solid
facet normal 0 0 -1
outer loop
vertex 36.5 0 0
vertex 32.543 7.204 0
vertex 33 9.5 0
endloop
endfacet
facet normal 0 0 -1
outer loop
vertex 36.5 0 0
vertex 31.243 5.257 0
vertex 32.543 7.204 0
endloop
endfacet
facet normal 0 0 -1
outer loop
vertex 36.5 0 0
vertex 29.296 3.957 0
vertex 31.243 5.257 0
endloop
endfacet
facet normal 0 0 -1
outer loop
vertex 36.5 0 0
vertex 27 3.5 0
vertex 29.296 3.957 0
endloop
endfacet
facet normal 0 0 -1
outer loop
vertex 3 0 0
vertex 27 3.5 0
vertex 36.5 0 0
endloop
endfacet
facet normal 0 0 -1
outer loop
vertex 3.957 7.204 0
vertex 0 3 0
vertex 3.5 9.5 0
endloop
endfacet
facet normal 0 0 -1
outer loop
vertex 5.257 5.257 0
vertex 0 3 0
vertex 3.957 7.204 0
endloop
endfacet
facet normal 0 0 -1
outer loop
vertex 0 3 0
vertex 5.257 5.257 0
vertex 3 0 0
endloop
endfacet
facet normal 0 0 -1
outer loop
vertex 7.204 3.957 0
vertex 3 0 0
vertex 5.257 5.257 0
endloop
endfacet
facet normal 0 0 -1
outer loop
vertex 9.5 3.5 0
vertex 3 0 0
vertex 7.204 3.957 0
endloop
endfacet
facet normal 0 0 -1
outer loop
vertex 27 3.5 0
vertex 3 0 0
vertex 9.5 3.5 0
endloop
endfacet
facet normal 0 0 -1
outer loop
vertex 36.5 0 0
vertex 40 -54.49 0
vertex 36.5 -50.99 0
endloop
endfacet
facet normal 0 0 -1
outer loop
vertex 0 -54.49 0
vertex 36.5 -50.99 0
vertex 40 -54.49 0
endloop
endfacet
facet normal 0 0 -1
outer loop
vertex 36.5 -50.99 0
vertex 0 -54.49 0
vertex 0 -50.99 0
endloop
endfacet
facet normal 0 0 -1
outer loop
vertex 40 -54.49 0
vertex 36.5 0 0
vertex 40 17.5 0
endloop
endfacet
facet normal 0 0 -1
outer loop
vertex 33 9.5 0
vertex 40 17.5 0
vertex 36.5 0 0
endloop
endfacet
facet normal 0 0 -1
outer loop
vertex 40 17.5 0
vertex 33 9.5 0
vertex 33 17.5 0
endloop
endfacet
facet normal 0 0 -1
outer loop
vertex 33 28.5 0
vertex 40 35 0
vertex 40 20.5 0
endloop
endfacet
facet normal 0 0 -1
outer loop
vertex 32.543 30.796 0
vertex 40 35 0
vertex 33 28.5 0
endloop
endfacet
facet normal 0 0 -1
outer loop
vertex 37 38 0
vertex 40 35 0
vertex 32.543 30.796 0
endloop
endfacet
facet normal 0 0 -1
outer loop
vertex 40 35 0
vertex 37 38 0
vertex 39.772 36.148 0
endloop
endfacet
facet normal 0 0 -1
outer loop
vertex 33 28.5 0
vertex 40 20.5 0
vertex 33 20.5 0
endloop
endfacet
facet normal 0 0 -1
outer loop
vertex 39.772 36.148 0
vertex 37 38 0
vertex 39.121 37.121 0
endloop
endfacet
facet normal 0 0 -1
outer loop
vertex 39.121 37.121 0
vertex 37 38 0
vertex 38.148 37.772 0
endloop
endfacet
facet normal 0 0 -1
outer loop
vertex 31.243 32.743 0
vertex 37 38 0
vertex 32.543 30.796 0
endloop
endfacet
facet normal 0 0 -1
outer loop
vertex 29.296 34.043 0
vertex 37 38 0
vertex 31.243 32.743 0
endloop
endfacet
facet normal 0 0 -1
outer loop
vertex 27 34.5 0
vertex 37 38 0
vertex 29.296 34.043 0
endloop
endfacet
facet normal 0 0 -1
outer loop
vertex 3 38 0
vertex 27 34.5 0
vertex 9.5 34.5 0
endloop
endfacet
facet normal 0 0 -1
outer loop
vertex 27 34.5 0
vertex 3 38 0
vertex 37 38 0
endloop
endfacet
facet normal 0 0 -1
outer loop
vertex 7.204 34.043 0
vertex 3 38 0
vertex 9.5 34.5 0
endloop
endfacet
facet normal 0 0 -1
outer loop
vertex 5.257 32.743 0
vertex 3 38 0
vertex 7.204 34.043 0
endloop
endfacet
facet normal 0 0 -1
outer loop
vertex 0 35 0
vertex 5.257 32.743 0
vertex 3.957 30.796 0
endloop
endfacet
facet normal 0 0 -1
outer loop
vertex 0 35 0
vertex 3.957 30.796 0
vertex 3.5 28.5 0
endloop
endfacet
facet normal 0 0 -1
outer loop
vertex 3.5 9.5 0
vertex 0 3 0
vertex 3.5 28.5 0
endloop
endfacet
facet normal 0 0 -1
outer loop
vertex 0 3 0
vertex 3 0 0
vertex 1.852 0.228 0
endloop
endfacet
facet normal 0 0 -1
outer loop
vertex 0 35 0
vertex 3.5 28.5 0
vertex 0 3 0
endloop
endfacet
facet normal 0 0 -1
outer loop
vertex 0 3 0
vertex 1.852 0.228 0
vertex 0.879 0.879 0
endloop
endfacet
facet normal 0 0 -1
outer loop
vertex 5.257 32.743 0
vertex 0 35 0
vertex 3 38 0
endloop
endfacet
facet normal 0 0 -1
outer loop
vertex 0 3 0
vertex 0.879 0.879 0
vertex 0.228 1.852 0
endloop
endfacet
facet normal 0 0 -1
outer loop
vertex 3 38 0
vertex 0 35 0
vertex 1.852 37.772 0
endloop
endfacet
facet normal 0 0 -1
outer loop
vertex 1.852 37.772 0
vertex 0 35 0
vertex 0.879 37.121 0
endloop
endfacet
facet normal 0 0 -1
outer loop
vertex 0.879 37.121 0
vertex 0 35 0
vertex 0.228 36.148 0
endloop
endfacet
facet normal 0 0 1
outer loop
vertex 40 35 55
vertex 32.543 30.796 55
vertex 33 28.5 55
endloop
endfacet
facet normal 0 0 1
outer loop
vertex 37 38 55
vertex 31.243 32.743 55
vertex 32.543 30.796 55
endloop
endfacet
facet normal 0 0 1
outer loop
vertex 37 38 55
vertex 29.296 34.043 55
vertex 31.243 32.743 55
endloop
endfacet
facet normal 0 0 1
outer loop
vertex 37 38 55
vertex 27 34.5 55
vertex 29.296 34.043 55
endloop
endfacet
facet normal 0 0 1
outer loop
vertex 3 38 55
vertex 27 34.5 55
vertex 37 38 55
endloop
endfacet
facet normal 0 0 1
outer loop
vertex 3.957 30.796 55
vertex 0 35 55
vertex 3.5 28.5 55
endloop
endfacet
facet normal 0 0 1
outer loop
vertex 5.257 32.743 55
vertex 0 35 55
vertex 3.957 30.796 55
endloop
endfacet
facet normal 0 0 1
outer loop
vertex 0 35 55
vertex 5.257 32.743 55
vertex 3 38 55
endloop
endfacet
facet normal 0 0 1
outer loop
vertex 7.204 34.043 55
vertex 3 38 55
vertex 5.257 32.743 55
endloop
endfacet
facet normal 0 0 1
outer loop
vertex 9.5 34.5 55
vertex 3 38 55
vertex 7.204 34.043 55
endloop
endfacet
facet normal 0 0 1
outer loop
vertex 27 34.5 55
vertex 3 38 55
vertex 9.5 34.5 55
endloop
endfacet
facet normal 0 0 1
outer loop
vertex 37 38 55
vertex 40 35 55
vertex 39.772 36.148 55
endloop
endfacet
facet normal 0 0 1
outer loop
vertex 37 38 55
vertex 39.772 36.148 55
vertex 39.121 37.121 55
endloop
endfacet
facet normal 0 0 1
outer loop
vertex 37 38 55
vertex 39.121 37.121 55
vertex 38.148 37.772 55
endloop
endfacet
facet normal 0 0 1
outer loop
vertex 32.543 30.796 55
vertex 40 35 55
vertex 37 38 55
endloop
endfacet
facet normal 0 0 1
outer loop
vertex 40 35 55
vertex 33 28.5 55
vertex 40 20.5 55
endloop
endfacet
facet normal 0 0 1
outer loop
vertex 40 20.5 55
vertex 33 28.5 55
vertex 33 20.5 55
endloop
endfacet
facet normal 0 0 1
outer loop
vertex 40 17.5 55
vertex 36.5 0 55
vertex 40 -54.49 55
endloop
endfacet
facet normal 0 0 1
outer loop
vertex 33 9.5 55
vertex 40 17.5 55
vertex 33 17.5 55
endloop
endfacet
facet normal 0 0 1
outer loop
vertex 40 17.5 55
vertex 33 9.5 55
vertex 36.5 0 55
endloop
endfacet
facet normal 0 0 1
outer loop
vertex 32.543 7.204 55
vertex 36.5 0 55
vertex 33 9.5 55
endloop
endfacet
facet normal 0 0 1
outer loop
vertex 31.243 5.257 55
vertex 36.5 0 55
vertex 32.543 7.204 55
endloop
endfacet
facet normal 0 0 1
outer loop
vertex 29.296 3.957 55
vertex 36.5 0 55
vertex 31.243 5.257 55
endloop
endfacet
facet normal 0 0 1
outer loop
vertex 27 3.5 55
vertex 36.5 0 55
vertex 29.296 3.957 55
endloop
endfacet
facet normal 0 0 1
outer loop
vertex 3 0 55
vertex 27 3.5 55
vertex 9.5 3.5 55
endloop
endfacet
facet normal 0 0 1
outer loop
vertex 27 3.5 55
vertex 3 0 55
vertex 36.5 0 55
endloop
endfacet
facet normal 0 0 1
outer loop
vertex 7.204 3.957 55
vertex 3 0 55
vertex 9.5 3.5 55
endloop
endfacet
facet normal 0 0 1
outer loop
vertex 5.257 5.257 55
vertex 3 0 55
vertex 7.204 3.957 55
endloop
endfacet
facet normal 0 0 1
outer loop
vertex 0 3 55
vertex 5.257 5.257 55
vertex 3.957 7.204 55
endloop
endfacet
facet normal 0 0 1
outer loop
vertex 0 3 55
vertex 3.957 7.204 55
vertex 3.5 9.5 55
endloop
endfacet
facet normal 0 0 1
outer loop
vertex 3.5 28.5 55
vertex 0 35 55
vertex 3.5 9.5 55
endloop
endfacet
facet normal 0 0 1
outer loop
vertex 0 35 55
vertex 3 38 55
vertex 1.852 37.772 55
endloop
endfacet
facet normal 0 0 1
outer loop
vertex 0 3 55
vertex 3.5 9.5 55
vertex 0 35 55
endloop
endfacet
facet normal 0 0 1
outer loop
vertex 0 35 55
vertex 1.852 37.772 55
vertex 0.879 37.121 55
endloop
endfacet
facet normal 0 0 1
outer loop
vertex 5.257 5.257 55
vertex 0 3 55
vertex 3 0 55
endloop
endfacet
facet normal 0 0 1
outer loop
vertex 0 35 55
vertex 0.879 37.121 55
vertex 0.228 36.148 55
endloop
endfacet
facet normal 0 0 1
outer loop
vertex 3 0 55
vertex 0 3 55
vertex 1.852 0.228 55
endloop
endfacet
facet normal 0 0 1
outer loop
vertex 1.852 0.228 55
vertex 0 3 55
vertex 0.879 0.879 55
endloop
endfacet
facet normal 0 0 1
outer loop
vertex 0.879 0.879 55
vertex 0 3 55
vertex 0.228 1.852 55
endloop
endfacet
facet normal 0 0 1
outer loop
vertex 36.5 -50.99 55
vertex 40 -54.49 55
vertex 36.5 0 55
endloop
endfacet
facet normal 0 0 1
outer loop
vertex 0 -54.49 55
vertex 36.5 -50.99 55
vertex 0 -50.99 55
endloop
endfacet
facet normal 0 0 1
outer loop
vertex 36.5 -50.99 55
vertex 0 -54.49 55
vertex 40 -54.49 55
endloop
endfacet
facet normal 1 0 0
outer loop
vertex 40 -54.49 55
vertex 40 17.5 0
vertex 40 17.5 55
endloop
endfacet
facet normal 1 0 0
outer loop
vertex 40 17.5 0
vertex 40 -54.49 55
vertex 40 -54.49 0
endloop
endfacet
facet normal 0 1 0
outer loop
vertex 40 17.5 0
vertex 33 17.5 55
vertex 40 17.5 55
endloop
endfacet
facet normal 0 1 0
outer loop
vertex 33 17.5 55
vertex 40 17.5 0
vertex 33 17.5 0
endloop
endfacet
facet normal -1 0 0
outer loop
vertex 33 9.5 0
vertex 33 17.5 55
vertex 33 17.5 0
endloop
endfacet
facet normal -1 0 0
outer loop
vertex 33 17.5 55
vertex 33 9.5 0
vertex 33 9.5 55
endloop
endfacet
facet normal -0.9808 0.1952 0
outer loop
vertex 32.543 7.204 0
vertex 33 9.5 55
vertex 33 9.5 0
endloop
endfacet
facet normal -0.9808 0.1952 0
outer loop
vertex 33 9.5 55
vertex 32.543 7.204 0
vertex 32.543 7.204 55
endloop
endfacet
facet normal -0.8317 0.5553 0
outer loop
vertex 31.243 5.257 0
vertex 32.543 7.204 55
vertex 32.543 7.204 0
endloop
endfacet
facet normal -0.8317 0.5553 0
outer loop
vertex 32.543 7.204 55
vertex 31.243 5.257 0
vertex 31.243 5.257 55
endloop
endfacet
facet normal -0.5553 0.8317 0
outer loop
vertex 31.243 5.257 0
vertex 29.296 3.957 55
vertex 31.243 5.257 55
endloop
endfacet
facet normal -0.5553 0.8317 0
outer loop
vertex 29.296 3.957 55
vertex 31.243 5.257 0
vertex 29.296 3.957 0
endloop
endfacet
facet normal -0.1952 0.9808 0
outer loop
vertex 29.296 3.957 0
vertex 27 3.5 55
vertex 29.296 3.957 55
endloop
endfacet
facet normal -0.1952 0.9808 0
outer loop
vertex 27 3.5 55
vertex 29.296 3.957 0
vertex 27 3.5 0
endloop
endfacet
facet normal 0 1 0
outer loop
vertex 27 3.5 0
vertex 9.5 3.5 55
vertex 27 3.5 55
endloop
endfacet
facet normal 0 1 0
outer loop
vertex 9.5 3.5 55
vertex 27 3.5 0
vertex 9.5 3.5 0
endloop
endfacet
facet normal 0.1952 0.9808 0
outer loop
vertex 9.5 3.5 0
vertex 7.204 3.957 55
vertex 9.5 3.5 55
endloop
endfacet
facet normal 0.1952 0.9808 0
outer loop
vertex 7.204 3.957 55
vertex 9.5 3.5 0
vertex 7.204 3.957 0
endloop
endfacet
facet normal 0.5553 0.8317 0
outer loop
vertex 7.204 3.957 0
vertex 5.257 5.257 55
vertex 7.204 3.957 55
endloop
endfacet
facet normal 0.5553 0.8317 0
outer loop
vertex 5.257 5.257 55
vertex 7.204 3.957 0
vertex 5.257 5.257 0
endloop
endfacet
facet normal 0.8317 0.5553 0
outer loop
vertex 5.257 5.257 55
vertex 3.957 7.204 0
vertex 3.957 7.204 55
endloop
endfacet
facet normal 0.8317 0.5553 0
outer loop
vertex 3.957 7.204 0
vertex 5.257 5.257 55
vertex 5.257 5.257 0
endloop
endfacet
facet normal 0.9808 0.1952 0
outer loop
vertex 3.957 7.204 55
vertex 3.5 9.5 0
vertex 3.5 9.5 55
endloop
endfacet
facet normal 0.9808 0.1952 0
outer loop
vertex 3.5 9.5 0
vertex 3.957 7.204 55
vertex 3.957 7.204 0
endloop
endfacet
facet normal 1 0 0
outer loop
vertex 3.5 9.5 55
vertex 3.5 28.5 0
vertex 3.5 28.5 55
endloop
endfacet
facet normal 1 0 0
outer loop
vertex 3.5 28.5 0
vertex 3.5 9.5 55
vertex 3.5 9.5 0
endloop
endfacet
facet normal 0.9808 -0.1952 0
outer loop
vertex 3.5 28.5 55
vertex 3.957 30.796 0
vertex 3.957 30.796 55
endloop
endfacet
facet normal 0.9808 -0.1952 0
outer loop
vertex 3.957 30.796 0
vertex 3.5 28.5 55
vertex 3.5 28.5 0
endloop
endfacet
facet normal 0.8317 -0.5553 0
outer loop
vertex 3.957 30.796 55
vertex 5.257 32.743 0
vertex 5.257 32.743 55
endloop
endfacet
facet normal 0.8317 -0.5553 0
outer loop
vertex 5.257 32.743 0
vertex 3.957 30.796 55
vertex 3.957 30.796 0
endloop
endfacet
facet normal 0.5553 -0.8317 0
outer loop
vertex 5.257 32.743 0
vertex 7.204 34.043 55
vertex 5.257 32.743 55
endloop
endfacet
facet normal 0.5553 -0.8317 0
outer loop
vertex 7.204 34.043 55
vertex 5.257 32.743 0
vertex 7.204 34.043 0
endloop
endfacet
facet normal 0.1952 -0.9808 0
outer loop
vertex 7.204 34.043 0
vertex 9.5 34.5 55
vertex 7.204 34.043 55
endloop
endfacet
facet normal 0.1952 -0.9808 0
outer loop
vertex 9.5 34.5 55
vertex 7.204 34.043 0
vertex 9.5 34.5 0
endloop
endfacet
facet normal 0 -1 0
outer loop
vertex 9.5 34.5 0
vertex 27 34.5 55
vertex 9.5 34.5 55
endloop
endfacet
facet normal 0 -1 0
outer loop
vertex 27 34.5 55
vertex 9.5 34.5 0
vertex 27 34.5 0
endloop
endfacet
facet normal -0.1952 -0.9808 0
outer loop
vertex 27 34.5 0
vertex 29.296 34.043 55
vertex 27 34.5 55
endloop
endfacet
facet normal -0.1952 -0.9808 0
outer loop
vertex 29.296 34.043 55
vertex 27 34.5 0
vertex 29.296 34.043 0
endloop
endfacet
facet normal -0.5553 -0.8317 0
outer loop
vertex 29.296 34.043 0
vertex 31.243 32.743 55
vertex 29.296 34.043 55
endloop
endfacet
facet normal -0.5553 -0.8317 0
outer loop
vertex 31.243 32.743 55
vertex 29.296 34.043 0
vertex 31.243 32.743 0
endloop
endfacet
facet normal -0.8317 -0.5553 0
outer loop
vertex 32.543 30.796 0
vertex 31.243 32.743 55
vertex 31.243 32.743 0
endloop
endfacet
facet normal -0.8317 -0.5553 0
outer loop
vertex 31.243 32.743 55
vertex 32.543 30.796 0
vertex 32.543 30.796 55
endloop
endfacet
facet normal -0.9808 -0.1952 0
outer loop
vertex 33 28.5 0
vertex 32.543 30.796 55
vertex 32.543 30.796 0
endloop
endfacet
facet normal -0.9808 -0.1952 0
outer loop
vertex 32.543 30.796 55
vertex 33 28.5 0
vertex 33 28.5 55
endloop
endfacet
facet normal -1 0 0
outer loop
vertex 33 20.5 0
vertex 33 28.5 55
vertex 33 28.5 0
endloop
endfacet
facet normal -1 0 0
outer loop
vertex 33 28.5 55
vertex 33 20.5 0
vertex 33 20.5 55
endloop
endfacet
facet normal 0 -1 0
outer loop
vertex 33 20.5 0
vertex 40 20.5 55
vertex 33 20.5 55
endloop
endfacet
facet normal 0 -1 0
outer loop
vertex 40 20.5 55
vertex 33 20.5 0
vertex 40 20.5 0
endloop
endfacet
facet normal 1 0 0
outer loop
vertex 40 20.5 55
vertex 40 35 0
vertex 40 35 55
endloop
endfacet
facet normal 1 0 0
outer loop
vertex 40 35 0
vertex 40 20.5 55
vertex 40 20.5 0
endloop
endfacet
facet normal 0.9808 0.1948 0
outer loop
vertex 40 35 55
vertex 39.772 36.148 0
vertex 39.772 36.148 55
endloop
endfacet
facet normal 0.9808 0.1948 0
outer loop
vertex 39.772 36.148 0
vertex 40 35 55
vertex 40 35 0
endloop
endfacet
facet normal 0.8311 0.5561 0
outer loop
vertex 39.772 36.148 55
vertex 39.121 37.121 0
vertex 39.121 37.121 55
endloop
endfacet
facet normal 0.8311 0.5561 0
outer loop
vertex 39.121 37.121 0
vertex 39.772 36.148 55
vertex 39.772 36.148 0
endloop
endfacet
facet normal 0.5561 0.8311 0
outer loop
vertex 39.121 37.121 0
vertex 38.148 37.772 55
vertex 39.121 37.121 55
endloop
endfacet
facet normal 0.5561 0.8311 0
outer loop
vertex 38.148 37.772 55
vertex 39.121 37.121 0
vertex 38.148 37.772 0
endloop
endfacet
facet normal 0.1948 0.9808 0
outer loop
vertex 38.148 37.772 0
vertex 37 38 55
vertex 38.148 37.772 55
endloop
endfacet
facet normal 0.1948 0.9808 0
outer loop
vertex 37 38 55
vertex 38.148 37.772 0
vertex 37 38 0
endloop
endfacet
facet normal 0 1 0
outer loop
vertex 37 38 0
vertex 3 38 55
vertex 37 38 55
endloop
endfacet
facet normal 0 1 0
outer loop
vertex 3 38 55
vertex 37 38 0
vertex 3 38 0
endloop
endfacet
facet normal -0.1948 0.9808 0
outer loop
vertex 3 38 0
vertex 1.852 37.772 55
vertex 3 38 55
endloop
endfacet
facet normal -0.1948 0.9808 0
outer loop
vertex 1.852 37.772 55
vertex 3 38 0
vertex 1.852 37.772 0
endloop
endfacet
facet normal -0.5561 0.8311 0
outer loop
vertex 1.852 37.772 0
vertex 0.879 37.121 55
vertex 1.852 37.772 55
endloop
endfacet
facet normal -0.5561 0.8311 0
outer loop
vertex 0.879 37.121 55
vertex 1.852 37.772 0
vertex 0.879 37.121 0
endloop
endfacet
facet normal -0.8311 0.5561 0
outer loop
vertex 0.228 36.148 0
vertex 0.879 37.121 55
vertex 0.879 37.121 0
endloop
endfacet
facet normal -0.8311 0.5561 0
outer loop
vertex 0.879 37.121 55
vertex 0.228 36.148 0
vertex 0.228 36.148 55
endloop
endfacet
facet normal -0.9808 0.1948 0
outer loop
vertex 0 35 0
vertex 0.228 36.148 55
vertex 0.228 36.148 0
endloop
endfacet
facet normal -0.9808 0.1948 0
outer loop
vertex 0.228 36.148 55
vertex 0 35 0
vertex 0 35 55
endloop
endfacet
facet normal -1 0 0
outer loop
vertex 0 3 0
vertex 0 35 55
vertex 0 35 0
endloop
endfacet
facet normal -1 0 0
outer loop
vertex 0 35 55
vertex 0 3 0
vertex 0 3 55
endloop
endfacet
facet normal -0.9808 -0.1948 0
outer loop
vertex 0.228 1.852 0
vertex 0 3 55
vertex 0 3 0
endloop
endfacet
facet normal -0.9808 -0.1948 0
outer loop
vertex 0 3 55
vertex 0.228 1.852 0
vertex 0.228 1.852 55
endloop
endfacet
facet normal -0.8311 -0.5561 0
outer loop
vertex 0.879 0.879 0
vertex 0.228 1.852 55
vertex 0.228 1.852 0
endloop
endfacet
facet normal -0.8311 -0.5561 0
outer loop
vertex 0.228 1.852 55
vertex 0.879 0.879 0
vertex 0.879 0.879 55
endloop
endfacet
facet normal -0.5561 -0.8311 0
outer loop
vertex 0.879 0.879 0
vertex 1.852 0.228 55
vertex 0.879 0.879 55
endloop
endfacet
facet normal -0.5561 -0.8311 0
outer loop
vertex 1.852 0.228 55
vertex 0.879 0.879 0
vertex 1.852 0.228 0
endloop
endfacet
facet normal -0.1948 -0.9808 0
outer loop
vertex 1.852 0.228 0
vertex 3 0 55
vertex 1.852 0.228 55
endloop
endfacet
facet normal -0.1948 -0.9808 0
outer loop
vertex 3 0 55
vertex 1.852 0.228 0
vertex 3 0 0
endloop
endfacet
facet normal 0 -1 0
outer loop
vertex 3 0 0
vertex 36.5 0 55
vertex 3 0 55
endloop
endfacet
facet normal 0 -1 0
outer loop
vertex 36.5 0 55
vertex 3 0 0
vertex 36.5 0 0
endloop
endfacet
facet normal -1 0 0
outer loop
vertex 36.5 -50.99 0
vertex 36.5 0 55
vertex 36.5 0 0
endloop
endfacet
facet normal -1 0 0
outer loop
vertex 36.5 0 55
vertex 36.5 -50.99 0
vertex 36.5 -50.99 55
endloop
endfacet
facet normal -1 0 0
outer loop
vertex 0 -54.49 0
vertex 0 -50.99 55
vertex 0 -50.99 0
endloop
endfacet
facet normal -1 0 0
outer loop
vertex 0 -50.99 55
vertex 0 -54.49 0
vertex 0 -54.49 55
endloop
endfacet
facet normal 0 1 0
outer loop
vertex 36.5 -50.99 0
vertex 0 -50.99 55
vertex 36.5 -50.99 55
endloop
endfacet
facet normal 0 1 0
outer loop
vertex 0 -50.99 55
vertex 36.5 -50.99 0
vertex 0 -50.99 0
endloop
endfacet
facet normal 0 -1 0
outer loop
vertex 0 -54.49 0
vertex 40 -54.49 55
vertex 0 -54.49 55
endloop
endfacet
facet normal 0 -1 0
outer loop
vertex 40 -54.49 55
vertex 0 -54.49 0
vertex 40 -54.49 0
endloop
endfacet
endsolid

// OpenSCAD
distanceWallWartSticksOut=38;
powerbarHeight=36.5;
powerbarWidth=51;
wallWartWidth=55;
thickness=3.5;
innerCorner=6;
outerCorner=3;
cutOut=3;
thickness=3.5;

module end_of_parameters_dummy() {}

//use <roundedsquare.scad>;
module roundedSquare(size=[10,10], radius=1, center=false, $fn=16) {
    size1 = (size+0==size) ? [size,size] : size;
    if (radius <= 0) {
        square(size1, center=center);
    }
    else {
        translate(center ? -size1/2 : [0,0])
        hull() {
            translate([radius,radius]) circle(r=radius);
            translate([size1[0]-radius,radius]) circle(r=radius);
            translate([size1[0]-radius,size1[1]-radius]) circle(r=radius);
            translate([radius,size1[1]-radius]) circle(r=radius);
        }
    }
}

module roundedOpenTopBox(size=[10,10,10], radius=2, wall=1, solid=false) {
    render(convexity=2)
    difference() {
        linear_extrude(height=size[2]) roundedSquare(size=[size[0],size[1]], radius=radius);
        if (!solid) {
            translate([0,0,wall])
            linear_extrude(height=size[2]-wall)
            translate([wall,wall]) roundedSquare(size=[size[0]-2*wall,size[1]-2*wall], radius=radius-wall);
        }
    }
}


module dummy(){}

w =distanceWallWartSticksOut;
h =powerbarHeight;
l =wallWartWidth;
extra=powerbarWidth;

module main() {
    linear_extrude(height=l)
    render(convexity=2)
    difference() {
        roundedSquare([h+thickness,w],radius=outerCorner);
        translate([thickness,thickness])
        roundedSquare([h-2*thickness,w-2*thickness],radius=innerCorner);
        translate([h-thickness-1,w/2-cutOut/2]) square([thickness+2+thickness,cutOut]);
    }
    translate([h,-extra])
    cube([thickness,extra+2*outerCorner,l]);
    translate([0,-extra-thickness+0.01])
    cube([h+thickness,thickness,l]);
}

main();
